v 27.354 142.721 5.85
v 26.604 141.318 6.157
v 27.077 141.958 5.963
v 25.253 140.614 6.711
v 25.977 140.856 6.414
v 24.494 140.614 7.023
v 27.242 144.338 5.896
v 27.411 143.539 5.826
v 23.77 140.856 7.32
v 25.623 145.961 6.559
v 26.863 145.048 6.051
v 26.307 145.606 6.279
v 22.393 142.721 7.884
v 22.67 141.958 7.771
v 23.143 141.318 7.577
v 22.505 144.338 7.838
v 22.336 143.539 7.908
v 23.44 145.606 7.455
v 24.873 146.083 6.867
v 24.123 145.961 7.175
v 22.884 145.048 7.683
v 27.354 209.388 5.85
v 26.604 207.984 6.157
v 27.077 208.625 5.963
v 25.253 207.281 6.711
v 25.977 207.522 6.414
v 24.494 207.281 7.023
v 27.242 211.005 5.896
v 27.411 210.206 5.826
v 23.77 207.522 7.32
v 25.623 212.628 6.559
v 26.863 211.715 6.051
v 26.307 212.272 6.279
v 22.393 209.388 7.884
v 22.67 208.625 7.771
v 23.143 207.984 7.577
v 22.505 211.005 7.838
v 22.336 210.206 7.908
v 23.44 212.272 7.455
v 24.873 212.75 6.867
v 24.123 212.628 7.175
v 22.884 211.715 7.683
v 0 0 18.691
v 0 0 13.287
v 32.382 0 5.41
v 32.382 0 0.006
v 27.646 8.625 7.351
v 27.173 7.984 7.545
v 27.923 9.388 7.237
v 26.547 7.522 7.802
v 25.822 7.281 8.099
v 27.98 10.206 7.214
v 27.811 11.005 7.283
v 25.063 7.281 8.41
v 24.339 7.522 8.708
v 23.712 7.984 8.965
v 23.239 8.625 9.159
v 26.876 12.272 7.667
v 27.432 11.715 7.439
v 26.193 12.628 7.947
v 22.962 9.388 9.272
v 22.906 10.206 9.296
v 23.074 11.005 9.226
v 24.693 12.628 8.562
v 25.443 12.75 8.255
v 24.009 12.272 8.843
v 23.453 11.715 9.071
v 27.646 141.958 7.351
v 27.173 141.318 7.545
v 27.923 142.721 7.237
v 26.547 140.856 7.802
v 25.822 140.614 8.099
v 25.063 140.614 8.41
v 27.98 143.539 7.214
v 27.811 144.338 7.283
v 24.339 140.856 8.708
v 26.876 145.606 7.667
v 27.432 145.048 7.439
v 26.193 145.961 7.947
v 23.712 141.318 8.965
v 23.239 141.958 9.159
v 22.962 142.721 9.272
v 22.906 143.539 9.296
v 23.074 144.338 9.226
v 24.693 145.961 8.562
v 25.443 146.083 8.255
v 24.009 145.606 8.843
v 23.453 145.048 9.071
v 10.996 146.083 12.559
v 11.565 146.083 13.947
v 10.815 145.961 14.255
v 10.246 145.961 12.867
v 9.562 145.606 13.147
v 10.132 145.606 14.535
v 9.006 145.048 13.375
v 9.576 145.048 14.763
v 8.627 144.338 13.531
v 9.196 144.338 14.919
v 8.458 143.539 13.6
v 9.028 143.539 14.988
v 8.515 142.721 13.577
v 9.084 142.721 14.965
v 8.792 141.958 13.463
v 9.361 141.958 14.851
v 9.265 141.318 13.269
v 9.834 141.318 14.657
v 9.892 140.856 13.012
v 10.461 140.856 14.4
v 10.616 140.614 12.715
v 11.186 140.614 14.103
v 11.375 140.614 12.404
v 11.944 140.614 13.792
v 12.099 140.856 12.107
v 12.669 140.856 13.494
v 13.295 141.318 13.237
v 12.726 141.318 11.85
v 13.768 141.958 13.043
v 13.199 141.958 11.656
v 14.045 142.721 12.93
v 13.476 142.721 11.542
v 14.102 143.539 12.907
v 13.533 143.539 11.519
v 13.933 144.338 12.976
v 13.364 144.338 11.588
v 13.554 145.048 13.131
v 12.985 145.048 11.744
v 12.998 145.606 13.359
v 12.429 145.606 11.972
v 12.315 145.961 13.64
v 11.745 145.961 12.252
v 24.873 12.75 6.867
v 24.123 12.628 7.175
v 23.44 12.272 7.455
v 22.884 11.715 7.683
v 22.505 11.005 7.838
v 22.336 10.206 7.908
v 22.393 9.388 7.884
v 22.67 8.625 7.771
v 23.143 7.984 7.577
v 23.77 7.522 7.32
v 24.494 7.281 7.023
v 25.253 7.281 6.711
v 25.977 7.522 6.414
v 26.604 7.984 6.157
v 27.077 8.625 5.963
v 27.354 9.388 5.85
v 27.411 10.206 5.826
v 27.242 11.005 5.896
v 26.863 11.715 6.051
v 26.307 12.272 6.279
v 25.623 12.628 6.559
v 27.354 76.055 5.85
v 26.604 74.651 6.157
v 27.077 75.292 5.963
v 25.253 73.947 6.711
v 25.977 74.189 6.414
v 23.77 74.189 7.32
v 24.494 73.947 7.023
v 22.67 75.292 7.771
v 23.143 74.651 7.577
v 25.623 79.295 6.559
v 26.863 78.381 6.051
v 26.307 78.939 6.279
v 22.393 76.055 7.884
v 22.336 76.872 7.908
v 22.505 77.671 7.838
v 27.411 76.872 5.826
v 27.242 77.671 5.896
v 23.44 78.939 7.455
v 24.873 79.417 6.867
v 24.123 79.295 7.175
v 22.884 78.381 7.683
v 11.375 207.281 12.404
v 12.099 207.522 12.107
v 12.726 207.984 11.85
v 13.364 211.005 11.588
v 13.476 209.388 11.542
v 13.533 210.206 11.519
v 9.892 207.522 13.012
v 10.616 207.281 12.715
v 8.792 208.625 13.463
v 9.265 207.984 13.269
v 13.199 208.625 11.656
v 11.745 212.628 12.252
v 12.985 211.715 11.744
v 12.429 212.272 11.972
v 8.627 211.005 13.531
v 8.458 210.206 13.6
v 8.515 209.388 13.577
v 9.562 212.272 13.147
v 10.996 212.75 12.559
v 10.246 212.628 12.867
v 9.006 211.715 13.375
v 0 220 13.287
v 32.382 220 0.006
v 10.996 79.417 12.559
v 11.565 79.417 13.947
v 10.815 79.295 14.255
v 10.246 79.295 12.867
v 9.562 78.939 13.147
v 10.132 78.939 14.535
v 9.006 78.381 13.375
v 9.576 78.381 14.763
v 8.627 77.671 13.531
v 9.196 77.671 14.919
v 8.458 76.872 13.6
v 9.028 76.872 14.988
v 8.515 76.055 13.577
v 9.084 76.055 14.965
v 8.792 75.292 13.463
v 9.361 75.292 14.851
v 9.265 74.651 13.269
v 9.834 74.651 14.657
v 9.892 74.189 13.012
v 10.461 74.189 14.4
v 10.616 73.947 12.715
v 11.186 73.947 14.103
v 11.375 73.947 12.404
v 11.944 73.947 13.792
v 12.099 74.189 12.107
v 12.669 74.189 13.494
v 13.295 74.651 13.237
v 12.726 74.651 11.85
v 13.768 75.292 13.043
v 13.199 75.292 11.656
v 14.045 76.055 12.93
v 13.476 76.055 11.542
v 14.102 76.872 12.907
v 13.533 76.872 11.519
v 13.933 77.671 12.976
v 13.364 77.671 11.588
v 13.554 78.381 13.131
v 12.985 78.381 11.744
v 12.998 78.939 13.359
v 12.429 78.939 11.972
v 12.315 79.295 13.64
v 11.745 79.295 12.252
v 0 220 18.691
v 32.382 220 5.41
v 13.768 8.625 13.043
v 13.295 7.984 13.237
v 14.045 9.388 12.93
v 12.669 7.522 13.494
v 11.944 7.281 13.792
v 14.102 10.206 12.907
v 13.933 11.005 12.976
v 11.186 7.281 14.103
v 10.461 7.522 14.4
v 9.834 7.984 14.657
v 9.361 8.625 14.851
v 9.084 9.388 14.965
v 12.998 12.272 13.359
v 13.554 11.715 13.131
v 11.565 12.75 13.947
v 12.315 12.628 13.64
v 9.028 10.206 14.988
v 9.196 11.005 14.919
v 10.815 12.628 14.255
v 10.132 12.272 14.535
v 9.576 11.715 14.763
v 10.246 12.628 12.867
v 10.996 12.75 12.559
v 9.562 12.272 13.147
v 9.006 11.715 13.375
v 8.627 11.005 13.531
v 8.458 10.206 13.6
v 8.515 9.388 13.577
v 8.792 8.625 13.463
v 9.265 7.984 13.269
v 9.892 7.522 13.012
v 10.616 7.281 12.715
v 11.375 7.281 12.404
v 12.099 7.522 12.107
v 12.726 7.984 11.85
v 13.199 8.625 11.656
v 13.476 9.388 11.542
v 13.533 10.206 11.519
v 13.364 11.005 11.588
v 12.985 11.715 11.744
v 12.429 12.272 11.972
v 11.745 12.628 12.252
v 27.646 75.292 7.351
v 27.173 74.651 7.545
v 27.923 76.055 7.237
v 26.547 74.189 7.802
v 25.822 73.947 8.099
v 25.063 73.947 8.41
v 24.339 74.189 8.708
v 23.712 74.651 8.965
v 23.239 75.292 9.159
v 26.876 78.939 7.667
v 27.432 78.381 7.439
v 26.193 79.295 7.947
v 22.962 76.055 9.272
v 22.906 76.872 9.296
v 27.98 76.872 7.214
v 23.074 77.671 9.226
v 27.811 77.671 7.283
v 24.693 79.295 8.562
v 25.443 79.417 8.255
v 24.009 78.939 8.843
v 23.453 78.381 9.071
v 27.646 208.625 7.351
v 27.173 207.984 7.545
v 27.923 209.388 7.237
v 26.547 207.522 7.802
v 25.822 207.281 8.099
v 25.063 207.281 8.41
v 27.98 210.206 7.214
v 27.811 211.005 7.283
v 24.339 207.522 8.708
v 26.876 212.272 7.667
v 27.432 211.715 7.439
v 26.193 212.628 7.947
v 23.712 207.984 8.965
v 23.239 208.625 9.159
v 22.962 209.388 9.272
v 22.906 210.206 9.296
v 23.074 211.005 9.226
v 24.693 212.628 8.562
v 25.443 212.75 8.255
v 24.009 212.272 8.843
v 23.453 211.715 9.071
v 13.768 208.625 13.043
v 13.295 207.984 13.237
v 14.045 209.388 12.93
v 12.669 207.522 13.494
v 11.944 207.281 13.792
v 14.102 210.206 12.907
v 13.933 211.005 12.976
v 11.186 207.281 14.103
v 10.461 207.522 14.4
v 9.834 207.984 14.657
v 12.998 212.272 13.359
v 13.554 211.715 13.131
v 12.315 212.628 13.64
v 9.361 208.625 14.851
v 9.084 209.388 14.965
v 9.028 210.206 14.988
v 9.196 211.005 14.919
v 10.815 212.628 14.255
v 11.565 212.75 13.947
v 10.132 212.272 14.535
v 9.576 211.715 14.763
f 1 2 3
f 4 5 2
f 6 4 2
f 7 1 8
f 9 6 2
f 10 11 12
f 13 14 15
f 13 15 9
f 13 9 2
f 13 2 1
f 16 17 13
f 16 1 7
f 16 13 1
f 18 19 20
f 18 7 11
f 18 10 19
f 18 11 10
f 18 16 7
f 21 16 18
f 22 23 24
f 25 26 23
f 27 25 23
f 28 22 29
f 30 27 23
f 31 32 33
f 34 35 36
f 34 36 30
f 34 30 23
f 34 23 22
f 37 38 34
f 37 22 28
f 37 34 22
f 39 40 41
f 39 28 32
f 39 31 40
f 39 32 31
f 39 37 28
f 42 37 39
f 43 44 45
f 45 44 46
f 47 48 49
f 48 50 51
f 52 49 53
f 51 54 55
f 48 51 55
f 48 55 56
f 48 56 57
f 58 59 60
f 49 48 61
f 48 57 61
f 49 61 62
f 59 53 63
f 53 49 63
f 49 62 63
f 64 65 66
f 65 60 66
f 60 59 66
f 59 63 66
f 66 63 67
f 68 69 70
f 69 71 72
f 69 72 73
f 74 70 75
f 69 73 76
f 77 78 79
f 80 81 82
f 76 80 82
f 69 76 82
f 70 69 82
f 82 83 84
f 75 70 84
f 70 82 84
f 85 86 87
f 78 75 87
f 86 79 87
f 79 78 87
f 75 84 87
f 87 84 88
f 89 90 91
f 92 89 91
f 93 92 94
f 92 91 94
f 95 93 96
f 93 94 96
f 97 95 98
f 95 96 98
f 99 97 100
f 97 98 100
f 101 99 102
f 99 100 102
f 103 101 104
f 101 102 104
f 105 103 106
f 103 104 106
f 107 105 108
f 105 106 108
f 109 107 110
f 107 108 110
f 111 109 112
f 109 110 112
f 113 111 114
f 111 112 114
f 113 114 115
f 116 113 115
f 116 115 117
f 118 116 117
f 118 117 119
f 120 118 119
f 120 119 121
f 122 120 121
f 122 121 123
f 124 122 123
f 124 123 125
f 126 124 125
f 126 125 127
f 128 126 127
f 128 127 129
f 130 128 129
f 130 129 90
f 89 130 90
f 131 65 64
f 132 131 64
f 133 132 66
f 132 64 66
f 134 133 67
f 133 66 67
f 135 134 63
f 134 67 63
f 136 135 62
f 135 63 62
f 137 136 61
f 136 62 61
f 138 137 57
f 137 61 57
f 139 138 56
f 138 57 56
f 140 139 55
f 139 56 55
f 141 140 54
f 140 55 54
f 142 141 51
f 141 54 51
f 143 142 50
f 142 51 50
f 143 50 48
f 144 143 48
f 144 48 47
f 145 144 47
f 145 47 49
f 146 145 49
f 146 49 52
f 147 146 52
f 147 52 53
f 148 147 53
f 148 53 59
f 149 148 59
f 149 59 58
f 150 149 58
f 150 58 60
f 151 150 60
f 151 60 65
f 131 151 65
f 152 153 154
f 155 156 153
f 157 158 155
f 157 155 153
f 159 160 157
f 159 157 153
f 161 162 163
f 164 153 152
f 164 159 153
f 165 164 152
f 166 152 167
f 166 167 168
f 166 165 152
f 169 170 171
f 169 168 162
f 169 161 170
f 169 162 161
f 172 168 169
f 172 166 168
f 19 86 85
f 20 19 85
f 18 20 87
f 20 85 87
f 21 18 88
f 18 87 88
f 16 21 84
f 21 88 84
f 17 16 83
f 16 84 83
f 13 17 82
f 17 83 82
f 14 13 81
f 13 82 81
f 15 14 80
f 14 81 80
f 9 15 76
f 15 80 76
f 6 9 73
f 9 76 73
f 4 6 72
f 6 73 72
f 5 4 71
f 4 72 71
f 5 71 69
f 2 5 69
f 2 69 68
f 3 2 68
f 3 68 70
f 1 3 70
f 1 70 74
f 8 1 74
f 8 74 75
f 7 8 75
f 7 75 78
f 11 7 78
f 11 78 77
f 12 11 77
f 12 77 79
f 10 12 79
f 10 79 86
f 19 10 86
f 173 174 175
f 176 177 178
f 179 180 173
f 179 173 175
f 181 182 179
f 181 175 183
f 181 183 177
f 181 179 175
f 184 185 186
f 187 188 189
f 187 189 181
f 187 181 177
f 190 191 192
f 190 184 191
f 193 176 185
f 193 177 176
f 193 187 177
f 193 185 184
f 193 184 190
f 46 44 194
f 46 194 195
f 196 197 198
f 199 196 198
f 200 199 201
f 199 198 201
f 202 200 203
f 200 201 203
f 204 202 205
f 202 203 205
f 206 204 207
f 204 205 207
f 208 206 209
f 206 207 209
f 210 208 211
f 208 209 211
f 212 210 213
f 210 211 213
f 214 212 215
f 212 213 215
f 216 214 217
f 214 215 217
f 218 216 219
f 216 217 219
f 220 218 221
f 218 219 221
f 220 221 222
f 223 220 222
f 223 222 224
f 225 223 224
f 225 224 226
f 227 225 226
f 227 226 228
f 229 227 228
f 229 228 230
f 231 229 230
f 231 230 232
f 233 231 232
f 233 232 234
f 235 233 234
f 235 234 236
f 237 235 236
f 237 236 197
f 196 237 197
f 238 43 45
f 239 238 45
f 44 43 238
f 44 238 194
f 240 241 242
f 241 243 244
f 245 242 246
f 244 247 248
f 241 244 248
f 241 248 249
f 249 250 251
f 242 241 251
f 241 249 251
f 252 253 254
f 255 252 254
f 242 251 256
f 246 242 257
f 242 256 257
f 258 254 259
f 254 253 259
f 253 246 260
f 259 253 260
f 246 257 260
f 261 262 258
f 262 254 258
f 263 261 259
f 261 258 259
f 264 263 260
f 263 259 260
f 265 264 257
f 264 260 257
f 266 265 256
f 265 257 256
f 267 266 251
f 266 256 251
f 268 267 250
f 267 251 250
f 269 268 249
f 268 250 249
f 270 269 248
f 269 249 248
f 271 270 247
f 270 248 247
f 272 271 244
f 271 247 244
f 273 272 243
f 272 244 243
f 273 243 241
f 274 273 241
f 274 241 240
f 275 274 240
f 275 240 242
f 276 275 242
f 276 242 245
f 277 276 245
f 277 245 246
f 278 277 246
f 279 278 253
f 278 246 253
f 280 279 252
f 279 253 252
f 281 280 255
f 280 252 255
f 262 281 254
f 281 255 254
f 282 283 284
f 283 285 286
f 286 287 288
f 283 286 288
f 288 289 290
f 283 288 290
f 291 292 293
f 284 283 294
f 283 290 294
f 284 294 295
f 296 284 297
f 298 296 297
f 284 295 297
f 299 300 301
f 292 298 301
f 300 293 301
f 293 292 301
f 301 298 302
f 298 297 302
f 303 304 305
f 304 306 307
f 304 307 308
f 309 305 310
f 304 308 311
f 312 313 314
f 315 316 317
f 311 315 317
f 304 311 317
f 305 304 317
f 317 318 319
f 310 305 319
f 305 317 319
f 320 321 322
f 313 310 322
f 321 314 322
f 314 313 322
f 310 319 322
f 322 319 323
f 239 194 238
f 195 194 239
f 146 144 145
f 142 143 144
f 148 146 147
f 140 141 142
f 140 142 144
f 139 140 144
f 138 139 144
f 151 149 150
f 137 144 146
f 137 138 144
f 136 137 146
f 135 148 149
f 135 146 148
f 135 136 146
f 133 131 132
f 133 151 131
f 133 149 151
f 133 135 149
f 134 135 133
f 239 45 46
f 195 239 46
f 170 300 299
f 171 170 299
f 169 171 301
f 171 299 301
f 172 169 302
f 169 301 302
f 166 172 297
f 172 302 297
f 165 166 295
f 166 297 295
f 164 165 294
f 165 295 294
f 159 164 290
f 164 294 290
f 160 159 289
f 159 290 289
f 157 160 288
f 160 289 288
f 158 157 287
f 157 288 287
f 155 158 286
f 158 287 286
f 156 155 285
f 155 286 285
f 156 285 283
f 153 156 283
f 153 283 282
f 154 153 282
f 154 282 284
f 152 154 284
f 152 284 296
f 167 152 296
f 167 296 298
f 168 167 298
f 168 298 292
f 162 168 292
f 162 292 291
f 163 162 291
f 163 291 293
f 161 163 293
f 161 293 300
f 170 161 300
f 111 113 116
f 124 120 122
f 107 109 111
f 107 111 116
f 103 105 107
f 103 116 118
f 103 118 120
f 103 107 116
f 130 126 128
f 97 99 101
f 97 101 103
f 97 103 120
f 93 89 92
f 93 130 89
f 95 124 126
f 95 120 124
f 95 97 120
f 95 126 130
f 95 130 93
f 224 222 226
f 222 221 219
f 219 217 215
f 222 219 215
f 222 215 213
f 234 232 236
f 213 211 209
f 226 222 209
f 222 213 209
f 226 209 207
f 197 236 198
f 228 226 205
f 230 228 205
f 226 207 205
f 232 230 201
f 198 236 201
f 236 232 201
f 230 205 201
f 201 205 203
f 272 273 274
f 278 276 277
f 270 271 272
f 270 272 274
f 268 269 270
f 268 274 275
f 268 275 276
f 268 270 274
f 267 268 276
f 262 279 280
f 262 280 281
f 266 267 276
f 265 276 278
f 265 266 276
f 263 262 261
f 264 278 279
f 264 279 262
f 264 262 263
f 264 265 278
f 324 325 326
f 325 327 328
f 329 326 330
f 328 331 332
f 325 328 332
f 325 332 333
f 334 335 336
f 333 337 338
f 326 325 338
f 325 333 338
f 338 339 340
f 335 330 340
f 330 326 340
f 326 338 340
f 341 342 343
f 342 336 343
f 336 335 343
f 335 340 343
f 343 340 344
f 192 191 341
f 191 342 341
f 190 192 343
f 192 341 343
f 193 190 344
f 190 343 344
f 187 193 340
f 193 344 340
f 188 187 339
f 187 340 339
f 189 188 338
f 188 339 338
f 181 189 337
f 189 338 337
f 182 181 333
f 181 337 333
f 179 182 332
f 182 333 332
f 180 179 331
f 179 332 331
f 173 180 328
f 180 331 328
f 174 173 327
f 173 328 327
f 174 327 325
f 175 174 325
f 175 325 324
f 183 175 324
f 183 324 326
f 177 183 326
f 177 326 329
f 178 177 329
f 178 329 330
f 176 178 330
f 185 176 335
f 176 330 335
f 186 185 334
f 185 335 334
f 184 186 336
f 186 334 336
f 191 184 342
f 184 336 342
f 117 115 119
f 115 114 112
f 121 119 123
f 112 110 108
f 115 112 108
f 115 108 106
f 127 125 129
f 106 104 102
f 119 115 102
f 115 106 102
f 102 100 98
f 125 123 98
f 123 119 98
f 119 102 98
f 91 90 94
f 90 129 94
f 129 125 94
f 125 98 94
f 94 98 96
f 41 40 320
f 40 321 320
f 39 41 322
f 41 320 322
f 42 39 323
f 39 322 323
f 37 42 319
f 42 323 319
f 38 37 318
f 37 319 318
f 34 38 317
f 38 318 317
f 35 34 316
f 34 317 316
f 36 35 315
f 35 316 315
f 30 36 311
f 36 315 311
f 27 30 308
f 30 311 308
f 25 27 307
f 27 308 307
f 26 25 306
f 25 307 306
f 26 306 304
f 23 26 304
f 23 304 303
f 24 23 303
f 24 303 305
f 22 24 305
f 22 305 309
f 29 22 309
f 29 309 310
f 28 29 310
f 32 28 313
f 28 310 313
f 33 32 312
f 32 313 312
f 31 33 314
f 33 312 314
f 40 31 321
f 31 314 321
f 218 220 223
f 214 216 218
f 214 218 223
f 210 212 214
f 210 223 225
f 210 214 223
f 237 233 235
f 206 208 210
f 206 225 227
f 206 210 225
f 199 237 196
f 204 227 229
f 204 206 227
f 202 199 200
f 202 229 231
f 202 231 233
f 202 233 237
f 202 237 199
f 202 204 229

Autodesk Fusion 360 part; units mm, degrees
sketch "Name Sign LED Holder Bottom" plane through (0, 0, 0) normal (0, 1, 0) x (1, 0, 0)
  line L0 (-0.0003, -18.6907) -> (-0.0003, -13.2867)
  line L1 (32.3821, -5.4097) -> (32.3821, -0.0057)
  line L2 (-0.0003, -13.2867) -> (32.3821, -0.0057)
  line L3 (-0.0003, -18.6907) -> (32.3821, -5.4097)
  dimension "d36" = 5.404
  dimension "d37" = 5.404
  dimension "d38" = 112.3
  dimension "d39" = 35
  dimension "d40" = 4.9998
extrude "Extrude1" add sketch "Name Sign LED Holder Bottom" along normal blind 220
sketch "Magnet Holes" plane through (6.5618, 0, 15.9994) normal (0.3795, 0, 0.9252) x (0, 1, 0)
  line L0 (0, 7.0925) -> (0, -27.9075)
  line L1 (0, -27.9075) -> (220, -27.9075)
  line L2 (220, -27.9075) -> (220, 7.0925)
  line L3 (220, 7.0925) -> (0, 7.0925)
  circle A0 centre (10, -20.4075) radius 2.75
  dimension "d50" = 5.5
  dimension "d51" = 10
  dimension "d52" = 7.5
extrude "Extrude4" cut sketch "Magnet Holes" against normal blind 1.5 contours A0
pattern_linear "R-Pattern1" count 4 spacing 66.6667 along (0, 1, 0) count 2 spacing 15 along (-0.9252, 0, 0.3795) of "Extrude4"
equation "d4 = 200 mm + 10 mm + 5 mm + 5 mm"
equation "magnet_hole_diameter = 5.5 mm"
equation "magnet_hole_depth = 1.5 mm"
equation "magnet_hole_side_offset = 10 mm"
equation "magnet_hole_top_offset = 7.5 mm"
equation "magnet_pattern_length = 220.00 mm - 2 * ( magnet_hole_side_offset )"
equation "magnet_pattern_height = 35.00 mm - vertical_part_width - 2 * ( magnet_hole_top_offset )"
equation "vertical_part_width = 5.00 mm"
equation "d50 = magnet_hole_diameter"
equation "d51 = magnet_hole_side_offset"
equation "d52 = magnet_hole_top_offset"
equation "d57 = magnet_pattern_length"
equation "d58 = magnet_pattern_height"
